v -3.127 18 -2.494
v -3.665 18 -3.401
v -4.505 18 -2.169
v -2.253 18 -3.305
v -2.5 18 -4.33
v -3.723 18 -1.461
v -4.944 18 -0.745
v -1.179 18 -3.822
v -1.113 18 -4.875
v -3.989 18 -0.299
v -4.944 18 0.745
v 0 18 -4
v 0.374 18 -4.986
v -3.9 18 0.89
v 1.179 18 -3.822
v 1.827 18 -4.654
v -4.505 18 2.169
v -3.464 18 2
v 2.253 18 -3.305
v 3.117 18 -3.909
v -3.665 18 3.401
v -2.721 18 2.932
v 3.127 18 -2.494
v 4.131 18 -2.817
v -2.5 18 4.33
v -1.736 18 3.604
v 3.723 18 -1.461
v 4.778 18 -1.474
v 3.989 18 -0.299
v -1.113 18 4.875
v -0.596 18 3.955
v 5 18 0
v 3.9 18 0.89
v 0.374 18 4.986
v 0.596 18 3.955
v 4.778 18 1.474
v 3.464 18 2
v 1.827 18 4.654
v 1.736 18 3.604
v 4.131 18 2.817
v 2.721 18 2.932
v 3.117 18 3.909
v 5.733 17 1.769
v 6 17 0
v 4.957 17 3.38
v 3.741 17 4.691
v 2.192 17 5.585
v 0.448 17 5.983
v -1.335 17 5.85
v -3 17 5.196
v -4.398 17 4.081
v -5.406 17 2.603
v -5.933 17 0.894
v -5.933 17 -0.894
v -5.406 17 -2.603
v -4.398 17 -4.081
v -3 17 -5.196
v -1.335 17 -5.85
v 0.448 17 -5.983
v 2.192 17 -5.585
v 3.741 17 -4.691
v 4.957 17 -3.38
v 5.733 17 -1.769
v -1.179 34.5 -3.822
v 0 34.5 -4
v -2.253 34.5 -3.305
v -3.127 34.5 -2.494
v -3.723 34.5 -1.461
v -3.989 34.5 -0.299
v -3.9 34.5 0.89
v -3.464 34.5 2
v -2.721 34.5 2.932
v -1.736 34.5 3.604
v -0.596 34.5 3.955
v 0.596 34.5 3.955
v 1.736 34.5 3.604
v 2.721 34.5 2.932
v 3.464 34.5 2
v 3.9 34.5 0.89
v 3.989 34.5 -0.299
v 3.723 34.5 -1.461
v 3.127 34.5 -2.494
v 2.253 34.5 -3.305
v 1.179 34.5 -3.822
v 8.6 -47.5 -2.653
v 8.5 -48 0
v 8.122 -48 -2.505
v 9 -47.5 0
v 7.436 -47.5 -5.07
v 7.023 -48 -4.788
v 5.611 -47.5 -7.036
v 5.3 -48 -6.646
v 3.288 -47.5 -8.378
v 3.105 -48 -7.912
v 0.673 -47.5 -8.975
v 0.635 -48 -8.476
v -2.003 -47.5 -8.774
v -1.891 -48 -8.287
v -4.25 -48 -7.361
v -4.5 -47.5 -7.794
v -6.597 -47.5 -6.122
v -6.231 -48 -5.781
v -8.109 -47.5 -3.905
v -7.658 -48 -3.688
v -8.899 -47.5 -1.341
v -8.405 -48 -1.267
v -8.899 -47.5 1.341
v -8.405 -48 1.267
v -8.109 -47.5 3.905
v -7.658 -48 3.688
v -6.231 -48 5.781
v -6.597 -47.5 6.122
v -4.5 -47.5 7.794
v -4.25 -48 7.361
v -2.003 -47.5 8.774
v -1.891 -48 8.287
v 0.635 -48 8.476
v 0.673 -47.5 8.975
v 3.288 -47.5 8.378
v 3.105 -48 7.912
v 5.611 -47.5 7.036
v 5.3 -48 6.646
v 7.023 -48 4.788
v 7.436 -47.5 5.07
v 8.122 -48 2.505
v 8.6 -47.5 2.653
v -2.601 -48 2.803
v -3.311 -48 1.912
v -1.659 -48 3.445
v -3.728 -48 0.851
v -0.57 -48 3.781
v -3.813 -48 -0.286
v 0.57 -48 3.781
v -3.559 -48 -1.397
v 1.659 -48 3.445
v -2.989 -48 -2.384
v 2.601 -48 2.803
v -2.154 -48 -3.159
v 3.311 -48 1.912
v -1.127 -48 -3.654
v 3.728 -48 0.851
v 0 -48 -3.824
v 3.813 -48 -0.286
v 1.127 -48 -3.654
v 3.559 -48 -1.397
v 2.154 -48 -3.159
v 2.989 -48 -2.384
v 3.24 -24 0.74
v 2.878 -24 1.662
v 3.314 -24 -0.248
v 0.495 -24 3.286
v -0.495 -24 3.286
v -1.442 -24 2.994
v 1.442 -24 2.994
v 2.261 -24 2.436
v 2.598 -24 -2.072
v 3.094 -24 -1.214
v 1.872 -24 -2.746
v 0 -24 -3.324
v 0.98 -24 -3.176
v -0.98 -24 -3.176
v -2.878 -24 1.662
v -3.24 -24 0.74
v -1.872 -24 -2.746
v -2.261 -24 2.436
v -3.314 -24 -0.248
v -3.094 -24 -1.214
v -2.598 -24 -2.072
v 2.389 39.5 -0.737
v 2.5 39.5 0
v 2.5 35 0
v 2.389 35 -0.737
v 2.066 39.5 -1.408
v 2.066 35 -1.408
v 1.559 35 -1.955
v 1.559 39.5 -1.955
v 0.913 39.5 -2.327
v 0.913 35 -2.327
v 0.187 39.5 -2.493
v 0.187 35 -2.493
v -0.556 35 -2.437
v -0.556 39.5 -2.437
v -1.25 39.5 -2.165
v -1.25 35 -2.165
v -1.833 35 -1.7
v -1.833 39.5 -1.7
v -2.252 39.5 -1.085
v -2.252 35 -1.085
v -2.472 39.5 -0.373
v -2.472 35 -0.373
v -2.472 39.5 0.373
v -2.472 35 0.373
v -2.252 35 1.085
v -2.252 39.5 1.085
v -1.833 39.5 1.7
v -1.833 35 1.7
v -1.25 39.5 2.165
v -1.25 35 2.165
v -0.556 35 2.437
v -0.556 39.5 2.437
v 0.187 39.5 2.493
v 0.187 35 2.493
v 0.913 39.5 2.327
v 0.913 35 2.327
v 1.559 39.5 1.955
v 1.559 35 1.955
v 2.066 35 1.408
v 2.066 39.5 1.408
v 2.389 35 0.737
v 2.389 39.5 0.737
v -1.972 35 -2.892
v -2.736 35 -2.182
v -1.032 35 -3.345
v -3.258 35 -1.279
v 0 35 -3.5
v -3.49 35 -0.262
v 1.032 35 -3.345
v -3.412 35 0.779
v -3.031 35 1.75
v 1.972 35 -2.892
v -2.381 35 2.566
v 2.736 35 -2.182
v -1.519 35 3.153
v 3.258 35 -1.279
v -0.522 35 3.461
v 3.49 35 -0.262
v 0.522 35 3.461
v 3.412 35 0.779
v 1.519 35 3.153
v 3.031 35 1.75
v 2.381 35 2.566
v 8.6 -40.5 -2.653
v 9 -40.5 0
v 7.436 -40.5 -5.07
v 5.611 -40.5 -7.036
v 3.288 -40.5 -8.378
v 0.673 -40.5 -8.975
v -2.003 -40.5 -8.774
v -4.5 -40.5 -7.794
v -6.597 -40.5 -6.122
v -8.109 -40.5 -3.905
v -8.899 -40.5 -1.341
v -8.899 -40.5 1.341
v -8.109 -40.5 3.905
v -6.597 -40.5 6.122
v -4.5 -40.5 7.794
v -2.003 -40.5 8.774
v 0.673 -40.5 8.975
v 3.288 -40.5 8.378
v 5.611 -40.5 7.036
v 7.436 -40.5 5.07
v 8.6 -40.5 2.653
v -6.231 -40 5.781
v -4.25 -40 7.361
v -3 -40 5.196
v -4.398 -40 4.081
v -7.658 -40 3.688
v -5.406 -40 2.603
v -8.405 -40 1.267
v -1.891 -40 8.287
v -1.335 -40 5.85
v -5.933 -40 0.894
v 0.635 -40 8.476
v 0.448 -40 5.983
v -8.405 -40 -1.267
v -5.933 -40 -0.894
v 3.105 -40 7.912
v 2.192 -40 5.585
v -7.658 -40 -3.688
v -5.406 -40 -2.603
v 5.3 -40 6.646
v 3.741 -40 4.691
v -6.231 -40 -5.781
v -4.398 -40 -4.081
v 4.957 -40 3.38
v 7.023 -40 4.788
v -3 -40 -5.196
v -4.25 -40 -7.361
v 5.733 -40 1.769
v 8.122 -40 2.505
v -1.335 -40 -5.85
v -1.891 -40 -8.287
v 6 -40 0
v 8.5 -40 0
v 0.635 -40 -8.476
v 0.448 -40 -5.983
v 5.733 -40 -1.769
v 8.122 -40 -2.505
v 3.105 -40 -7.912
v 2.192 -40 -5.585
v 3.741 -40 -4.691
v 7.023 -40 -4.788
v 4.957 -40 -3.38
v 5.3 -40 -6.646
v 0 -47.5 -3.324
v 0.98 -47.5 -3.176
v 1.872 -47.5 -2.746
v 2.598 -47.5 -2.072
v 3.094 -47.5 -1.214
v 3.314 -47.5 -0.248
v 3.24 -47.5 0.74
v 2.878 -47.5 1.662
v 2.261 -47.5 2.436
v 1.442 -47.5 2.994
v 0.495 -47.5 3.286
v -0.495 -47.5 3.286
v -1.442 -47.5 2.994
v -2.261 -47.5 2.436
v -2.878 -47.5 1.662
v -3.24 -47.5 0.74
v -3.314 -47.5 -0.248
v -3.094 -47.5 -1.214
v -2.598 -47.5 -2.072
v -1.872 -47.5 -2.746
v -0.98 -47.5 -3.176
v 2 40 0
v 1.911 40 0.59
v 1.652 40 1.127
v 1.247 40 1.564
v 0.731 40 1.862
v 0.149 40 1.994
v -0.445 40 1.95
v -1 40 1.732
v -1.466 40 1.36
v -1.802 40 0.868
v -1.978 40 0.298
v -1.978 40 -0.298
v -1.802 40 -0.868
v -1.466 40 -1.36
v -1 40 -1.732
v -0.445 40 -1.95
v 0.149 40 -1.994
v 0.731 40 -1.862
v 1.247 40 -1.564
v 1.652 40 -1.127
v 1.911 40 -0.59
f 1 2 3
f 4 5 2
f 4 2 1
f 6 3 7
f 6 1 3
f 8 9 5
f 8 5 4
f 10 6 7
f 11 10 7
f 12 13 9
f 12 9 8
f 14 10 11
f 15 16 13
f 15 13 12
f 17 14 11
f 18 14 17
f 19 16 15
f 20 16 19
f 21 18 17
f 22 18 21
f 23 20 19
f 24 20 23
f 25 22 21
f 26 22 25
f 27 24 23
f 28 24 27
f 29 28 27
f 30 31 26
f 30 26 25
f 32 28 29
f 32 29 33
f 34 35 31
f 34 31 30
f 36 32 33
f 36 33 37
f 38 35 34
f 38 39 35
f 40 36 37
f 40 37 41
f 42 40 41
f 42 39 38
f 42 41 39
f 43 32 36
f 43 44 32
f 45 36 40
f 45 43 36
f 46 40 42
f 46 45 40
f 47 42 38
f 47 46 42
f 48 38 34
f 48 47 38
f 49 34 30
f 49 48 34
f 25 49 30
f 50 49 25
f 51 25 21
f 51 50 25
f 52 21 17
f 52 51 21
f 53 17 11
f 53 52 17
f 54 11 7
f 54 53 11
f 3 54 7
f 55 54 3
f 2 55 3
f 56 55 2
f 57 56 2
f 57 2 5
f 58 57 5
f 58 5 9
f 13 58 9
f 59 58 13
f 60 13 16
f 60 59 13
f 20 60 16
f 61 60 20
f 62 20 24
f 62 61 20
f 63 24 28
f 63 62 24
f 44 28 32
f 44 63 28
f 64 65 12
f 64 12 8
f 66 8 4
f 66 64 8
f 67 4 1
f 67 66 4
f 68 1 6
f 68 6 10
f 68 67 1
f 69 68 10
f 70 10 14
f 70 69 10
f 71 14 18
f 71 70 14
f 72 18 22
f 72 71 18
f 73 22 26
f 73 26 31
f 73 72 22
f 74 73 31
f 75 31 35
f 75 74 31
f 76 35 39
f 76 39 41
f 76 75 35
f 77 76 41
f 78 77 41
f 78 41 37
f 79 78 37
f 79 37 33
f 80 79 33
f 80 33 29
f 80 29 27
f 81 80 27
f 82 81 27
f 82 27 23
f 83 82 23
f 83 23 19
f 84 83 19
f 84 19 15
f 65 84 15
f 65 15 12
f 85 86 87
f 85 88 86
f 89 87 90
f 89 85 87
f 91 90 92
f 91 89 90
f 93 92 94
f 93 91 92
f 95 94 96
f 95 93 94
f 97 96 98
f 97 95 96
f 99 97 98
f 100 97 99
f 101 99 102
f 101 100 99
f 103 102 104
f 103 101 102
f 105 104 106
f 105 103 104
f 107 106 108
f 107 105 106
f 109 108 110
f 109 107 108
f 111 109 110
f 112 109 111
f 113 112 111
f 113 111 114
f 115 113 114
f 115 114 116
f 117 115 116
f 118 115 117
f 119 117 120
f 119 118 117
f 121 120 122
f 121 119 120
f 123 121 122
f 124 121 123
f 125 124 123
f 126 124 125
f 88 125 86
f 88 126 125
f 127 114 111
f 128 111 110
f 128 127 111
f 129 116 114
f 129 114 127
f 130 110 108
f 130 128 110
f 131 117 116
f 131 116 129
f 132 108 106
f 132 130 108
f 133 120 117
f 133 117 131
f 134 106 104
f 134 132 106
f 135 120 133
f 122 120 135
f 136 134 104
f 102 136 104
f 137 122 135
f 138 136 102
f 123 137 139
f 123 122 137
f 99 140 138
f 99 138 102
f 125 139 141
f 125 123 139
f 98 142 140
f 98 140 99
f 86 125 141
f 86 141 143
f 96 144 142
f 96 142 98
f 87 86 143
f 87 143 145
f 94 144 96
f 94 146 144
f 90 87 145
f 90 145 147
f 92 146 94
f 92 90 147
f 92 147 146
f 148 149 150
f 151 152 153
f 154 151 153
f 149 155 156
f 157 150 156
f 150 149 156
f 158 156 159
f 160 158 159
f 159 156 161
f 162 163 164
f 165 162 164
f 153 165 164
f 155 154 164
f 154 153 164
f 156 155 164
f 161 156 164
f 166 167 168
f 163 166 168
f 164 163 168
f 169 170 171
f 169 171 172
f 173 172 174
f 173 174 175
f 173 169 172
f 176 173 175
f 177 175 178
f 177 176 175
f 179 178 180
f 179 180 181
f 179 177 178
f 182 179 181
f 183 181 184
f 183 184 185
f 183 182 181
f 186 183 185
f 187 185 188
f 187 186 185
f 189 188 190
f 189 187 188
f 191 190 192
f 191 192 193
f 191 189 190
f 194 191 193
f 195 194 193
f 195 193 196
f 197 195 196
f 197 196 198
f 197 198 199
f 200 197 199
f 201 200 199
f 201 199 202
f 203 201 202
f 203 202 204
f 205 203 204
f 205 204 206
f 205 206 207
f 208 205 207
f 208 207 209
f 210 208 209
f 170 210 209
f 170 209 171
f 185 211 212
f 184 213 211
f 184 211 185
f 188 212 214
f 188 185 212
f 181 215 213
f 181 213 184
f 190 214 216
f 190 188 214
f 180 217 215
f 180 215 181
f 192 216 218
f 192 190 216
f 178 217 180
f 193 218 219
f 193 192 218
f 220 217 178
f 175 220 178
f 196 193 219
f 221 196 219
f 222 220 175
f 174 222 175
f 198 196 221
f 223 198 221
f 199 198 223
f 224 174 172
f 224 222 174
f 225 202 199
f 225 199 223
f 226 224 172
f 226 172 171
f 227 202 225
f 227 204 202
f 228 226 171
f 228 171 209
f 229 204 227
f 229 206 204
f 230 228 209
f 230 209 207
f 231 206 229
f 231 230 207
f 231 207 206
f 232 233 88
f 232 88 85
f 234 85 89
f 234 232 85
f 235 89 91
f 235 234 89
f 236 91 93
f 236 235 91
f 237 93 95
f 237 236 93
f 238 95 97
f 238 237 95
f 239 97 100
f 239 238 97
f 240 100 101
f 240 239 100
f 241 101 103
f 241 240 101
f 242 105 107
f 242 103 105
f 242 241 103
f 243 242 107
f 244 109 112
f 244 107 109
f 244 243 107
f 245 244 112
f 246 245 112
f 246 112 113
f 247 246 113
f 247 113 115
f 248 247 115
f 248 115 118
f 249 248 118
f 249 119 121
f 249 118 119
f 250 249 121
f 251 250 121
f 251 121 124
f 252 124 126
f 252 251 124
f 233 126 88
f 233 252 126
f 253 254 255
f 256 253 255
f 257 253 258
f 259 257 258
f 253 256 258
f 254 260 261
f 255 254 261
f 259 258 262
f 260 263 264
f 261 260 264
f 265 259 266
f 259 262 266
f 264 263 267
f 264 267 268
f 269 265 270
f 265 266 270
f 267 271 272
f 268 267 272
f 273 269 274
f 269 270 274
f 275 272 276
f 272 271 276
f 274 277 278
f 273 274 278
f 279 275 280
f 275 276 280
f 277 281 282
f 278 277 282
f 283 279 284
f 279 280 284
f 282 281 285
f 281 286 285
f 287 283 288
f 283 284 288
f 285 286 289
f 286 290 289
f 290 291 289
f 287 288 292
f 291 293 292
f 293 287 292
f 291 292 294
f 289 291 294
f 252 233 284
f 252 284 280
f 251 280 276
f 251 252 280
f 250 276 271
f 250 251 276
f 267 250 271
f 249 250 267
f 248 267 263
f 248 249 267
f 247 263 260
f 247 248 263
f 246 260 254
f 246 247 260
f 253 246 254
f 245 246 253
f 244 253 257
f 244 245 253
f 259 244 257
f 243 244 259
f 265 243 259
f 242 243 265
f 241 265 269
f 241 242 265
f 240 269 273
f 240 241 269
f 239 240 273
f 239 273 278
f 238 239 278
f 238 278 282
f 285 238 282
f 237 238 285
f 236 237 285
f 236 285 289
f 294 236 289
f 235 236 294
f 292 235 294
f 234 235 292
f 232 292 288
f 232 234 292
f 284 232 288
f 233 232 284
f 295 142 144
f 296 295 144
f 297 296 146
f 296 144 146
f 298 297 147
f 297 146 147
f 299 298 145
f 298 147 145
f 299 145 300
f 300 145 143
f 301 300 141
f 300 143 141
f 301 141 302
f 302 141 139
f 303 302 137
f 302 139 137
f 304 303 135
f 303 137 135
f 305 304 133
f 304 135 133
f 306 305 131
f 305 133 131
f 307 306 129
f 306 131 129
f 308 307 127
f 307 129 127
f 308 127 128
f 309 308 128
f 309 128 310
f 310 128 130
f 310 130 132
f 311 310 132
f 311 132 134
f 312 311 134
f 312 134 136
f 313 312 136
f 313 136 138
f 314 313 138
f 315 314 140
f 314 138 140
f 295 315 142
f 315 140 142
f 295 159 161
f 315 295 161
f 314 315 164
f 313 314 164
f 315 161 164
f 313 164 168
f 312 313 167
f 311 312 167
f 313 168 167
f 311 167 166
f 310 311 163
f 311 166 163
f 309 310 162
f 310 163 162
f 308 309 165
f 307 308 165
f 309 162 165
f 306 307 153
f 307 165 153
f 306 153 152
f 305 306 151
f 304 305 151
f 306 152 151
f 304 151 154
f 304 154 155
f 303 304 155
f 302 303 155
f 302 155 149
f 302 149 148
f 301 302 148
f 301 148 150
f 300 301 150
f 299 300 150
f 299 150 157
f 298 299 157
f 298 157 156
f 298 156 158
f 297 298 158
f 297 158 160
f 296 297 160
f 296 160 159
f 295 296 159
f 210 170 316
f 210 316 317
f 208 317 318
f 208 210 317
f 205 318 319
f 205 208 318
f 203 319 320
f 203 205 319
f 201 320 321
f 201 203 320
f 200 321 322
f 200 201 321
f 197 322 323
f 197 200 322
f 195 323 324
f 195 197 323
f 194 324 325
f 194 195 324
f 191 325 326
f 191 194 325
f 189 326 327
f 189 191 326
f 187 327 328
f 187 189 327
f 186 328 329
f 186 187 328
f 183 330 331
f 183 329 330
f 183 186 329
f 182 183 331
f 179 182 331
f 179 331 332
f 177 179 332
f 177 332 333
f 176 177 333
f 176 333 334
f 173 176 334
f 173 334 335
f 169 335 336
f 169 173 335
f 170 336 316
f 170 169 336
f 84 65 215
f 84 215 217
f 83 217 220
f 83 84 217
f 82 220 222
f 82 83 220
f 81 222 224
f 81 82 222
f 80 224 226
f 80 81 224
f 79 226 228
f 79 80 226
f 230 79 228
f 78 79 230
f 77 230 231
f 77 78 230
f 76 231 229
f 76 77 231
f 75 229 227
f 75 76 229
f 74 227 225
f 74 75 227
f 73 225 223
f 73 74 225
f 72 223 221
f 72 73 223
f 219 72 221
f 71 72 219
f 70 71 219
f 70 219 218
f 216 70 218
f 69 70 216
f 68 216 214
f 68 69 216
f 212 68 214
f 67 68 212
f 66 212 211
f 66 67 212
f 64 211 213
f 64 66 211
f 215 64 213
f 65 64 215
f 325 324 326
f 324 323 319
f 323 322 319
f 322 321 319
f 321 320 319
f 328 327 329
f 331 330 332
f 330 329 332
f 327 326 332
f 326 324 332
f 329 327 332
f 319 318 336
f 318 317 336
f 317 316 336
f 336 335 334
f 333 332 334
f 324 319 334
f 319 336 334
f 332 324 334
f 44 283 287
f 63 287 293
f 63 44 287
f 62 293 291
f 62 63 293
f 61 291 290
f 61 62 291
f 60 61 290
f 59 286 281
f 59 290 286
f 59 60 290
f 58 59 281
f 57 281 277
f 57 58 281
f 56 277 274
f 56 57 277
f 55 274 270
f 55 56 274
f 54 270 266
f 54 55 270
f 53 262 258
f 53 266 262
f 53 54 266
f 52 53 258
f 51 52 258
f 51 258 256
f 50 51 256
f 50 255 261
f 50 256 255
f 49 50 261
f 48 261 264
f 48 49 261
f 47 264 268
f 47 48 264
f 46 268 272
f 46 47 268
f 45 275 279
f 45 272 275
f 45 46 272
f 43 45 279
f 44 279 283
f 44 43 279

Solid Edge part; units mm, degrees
sketch "Sketch1" plane through (0, 0, 0) normal (0, -1, 0) x (1, 0, 0)
  circle A0 centre (0, 0) radius 6
  dimension "D1" = 12
extrude "Protrusion1" add sketch "Sketch1" along normal mid plane 80
sketch "Sketch2" plane through (0, -40, 0) normal (0, -1, 0) x (1, 0, 0)
  circle A0 centre (0, 0) radius 9
  dimension "D1" = 18
extrude "Ausprägung_2" add sketch "Sketch2" along normal blind 8
sketch "Sketch3" plane through (0, 40, 0) normal (0, 1, 0) x (1, 0, 0)
  circle A0 centre (0, 0) radius 2.5
  dimension "D1" = 5
extrude "Ausschnitt_1" cut sketch "Sketch3" against normal blind 5 flip side to cut
sketch "Sketch4" plane through (0, 35, 0) normal (0, 1, 0) x (0, 0, -1)
  circle A0 centre (0, 0) radius 4
  dimension "D1" = 8
extrude "Ausschnitt_2" cut sketch "Sketch4" against normal blind 17 flip side to cut
cosmetic_thread "Gewinde_1" size "M5" thread depth 4
chamfer "Fase_1" distance 0.5 angle 45 1 edges at (-2.5, 40, 0)
chamfer "Fase_2" distance 1 angle 45 1 edges at (0, 18, -6)
cosmetic_thread "Gewinde_2" size "M8" thread depth 15
chamfer "Fase_3" distance 0.5 angle 45 1 edges at (0, 35, 4)
hole "Bohrung_1" at (0, -48, 0) direction (0, 1, 0) diameter 6.647 depth 24 thread major 8 thread length 2
chamfer "Fase_4" distance 0.5 angle 45 1 edges at (0, -48, 3.3235)
chamfer "Fase_5" distance 0.5 angle 45 2 edges at (-9, -48, 0) (-9, -40, 0)
